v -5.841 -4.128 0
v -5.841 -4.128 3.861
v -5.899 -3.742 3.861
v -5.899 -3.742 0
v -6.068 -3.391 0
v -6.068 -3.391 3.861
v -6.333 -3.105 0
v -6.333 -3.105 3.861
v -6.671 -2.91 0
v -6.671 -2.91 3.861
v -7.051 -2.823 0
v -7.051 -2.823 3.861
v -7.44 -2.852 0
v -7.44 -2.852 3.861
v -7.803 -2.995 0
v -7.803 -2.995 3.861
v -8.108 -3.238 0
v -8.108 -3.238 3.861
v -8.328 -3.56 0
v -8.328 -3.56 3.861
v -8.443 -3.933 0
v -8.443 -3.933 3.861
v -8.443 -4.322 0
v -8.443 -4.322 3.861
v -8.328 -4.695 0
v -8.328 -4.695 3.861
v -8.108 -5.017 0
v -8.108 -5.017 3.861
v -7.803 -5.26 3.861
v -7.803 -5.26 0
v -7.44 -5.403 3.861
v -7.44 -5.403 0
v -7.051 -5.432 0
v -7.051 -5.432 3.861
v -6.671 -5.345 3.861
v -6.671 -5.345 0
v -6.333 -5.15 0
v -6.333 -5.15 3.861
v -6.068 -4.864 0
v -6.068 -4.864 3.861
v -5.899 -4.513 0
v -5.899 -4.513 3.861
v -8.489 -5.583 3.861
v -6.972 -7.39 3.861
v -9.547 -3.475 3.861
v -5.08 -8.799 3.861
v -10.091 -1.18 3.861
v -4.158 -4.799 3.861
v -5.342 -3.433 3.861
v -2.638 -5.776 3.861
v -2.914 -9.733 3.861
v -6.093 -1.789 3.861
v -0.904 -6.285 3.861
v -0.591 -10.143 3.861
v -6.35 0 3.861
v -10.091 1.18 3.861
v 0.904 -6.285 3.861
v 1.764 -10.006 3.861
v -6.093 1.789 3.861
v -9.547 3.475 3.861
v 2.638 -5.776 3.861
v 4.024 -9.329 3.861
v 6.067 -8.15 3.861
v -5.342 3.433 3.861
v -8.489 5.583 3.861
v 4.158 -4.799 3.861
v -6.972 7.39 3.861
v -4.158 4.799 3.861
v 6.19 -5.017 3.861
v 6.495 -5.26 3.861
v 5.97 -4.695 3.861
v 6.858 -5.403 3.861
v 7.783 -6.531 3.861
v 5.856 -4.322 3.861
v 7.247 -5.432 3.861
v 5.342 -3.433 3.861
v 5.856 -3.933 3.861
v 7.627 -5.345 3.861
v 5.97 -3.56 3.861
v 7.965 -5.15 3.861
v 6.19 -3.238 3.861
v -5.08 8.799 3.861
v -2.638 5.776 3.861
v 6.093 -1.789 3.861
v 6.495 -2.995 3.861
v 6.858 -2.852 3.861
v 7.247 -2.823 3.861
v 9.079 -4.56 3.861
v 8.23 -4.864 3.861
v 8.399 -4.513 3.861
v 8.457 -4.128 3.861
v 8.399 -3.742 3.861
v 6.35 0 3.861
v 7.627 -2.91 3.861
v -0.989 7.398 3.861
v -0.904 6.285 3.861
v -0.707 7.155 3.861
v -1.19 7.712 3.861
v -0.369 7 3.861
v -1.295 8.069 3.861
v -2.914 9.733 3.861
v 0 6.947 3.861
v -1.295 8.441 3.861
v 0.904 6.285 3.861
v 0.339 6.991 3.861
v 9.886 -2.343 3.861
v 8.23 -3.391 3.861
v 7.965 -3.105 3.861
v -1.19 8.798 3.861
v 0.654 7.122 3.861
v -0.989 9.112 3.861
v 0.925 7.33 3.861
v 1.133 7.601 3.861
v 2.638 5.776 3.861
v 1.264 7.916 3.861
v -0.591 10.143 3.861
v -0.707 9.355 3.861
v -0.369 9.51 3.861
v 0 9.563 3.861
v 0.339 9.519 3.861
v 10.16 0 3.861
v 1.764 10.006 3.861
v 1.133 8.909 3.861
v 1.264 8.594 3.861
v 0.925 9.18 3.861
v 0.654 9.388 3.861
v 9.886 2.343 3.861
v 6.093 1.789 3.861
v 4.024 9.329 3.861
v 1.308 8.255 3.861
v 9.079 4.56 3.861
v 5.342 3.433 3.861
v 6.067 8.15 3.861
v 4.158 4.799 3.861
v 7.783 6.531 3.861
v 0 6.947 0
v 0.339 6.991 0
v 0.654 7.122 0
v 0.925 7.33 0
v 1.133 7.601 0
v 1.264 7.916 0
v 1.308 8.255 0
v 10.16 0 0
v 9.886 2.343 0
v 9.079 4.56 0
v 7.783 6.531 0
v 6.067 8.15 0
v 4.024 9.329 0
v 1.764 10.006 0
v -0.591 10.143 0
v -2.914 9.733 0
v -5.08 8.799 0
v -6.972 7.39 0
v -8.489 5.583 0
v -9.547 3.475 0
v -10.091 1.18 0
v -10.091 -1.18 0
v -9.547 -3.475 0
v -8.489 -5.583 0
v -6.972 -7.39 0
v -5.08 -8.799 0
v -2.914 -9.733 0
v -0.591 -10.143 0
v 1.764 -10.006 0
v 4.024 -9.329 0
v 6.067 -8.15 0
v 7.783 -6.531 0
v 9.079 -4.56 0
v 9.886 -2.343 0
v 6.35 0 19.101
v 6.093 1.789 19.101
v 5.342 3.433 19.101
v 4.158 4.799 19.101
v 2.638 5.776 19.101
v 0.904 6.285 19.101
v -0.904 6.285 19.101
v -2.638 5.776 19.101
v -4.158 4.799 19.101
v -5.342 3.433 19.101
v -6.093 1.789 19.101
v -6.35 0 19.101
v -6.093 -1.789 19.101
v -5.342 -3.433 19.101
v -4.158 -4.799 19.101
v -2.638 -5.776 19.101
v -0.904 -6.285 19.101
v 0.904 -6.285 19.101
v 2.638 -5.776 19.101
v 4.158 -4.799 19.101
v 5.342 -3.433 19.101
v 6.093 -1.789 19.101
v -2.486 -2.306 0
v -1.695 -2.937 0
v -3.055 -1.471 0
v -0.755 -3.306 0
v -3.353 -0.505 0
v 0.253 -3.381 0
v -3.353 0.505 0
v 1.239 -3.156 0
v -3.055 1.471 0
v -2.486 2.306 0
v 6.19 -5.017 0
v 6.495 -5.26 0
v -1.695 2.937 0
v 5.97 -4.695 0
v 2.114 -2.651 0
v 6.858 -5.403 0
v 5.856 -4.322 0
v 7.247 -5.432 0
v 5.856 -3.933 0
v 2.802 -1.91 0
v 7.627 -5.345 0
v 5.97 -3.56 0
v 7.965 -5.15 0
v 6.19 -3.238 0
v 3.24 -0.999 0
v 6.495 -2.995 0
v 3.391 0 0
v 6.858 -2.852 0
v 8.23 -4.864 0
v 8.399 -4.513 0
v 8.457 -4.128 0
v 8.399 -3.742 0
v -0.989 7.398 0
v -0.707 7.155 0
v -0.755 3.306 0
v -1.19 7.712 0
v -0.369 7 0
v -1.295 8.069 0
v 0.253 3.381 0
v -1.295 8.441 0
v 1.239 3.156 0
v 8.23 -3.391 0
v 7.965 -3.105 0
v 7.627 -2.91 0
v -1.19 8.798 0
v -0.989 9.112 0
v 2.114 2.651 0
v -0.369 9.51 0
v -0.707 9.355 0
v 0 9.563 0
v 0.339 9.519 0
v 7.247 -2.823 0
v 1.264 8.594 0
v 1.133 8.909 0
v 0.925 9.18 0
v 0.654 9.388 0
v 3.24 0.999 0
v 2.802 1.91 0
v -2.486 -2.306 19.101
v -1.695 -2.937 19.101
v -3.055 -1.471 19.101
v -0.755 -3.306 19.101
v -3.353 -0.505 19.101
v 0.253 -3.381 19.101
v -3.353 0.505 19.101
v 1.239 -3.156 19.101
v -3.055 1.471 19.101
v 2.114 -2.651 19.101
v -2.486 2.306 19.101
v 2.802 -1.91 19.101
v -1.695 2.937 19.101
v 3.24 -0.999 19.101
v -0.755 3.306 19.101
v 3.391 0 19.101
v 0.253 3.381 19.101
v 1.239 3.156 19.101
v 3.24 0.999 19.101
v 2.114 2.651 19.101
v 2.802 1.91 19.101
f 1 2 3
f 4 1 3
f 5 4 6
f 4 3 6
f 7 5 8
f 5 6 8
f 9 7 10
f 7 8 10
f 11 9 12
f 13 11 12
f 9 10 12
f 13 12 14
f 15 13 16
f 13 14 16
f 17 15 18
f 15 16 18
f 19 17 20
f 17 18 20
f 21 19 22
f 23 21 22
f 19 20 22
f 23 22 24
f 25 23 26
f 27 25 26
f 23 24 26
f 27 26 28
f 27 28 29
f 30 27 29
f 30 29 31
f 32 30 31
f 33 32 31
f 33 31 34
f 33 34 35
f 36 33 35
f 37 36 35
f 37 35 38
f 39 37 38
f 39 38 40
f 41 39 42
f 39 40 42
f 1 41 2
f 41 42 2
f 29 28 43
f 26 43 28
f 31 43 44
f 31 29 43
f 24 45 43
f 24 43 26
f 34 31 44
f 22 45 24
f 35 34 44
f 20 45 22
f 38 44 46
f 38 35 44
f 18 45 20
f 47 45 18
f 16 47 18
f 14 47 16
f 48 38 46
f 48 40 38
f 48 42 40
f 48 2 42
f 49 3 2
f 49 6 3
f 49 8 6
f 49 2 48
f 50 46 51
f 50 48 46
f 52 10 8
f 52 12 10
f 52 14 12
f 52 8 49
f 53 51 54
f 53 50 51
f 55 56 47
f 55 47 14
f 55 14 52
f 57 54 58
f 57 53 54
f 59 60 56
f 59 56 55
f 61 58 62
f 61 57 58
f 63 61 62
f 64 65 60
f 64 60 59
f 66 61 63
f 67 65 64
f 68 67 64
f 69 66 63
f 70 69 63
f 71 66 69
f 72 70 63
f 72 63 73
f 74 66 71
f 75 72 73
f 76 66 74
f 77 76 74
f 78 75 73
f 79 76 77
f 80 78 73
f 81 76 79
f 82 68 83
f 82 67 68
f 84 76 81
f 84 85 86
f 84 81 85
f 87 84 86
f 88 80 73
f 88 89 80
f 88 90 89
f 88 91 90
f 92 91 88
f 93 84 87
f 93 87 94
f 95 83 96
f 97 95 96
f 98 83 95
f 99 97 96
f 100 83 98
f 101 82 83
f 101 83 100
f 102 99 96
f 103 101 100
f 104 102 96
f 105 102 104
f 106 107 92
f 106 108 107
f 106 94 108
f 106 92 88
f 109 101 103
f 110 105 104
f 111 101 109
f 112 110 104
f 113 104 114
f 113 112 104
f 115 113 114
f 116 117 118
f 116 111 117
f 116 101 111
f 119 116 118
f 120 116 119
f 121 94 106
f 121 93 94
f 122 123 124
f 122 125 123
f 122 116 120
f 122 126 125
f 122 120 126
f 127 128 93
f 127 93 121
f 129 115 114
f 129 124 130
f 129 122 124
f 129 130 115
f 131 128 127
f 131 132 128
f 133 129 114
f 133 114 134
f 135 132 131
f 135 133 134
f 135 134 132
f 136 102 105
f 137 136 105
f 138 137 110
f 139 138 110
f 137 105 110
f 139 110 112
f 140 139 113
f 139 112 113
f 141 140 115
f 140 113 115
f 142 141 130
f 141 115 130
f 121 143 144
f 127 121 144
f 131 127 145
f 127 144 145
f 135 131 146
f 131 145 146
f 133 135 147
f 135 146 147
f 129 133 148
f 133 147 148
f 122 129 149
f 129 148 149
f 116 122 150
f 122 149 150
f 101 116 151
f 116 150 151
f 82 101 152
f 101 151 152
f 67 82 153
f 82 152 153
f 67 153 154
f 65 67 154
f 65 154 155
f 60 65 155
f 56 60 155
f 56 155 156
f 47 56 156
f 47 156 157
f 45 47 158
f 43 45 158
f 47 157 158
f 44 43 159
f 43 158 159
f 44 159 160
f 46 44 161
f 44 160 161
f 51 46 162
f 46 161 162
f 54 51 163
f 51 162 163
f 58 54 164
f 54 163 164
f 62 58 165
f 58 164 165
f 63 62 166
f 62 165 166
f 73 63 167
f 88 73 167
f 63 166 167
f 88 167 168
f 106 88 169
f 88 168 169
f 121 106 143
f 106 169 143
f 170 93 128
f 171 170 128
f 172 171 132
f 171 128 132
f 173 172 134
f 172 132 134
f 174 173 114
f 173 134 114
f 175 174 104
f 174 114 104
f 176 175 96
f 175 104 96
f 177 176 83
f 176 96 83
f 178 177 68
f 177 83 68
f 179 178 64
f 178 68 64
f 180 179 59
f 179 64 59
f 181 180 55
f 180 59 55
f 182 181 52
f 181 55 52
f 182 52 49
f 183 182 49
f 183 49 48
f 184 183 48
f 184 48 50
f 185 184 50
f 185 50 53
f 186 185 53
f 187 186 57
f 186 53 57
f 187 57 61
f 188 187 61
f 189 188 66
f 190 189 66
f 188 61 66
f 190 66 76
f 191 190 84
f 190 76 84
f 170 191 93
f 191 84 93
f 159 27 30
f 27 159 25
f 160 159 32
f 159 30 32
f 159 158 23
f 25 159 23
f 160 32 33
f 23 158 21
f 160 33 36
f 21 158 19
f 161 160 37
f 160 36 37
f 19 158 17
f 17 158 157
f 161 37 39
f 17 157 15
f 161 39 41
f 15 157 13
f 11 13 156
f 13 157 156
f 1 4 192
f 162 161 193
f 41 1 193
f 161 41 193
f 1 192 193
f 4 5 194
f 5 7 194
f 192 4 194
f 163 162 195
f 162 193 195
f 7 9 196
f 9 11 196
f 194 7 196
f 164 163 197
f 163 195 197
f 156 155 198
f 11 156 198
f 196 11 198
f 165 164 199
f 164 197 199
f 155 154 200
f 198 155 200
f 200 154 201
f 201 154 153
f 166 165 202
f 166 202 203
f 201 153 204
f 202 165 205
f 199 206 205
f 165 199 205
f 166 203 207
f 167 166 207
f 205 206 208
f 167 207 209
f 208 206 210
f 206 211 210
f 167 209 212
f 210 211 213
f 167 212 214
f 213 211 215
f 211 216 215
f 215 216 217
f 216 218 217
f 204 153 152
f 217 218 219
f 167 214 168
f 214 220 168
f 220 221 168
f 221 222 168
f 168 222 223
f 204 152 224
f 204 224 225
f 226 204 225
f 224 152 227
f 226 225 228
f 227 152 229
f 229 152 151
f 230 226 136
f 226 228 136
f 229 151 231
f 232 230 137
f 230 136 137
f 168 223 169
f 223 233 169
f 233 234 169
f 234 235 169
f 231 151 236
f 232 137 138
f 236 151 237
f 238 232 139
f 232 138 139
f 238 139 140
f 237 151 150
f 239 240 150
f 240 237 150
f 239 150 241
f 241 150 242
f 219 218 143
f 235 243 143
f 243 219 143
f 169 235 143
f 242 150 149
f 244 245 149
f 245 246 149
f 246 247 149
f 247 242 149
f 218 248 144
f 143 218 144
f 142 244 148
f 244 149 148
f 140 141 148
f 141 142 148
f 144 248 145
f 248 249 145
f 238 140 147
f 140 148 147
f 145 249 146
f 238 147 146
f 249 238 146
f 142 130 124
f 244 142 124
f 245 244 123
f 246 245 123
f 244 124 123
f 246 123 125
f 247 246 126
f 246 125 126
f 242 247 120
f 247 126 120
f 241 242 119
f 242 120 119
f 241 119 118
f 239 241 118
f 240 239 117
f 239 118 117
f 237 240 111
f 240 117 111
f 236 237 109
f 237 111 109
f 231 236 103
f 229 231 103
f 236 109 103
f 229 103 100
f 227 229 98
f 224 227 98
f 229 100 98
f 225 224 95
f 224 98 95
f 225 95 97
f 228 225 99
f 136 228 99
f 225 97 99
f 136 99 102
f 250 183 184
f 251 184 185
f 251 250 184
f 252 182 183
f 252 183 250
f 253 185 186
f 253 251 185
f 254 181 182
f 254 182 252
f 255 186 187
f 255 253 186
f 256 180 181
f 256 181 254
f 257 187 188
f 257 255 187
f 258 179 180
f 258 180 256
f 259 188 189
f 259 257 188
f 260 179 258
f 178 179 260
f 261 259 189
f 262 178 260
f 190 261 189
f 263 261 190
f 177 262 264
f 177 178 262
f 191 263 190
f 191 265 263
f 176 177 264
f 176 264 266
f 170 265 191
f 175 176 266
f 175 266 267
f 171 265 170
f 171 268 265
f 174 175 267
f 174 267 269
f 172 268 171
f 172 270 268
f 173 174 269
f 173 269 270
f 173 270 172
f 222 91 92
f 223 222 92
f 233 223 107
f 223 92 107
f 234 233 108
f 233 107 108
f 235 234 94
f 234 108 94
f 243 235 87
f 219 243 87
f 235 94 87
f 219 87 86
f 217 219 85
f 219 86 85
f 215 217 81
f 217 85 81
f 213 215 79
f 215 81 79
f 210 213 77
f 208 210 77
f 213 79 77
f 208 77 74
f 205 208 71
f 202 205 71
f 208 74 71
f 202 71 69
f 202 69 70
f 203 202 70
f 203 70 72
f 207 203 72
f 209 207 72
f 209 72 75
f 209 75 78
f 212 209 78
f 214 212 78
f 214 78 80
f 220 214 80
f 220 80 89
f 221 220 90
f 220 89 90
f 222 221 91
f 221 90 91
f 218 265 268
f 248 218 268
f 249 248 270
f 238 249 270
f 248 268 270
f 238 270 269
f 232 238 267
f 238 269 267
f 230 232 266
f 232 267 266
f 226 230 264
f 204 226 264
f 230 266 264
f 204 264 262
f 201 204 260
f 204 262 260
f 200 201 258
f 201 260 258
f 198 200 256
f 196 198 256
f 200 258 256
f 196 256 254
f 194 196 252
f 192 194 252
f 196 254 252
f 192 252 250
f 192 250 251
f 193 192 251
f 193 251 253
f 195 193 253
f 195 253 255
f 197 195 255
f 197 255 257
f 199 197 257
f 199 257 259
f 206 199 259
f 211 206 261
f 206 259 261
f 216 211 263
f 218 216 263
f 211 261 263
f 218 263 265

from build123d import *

# Parameters (mm, degrees)
F0_R     = 10.16
F1_DEPTH = 3.8608
F2_R     = 6.35
F3_DEPTH = 15.24
F4_R     = 1.3081
F5_DEPTH = 3.8608
F6_R     = 3.3909
F7_DEPTH = 19.1008


with BuildPart() as f1:
    # F0 (on Top) → F1 (new body)
    with BuildSketch(Plane.XY):
        Circle(F0_R)
    extrude(amount=F1_DEPTH)

    # F2 (on face) → F3 (join)
    with BuildSketch(Plane.XY.offset(3.8608)):
        Circle(F2_R)
    extrude(amount=F3_DEPTH)

    # F4 (on face) → F5 (cut, through all)
    with BuildSketch(Plane.XY.offset(3.8608)):
        with BuildLine():
            ThreePointArc((0, 6.9469), (0.924966, 7.330034), (1.3081, 8.255))
            ThreePointArc((1.3081, 8.255), (0.924966, 9.179966), (0, 9.5631))
            Line((0, 9.5631), (0, 6.9469))
        make_face()
        with BuildLine():
            Line((0, 6.9469), (0, 9.5631))
            ThreePointArc((0, 9.5631), (-1.3081, 8.255), (0, 6.9469))
        make_face()
        with Locations((-7.14904, -4.1275)):
            Circle(F4_R)
        with Locations((7.14904, -4.1275)):
            Circle(F4_R)
    extrude(amount=-F5_DEPTH, mode=Mode.SUBTRACT)

    # F6 (on face) → F7 (cut, through all)
    with BuildSketch(Plane.XY.offset(19.1008)):
        Circle(F6_R)
    extrude(amount=-F7_DEPTH, mode=Mode.SUBTRACT)


solid = f1.part
